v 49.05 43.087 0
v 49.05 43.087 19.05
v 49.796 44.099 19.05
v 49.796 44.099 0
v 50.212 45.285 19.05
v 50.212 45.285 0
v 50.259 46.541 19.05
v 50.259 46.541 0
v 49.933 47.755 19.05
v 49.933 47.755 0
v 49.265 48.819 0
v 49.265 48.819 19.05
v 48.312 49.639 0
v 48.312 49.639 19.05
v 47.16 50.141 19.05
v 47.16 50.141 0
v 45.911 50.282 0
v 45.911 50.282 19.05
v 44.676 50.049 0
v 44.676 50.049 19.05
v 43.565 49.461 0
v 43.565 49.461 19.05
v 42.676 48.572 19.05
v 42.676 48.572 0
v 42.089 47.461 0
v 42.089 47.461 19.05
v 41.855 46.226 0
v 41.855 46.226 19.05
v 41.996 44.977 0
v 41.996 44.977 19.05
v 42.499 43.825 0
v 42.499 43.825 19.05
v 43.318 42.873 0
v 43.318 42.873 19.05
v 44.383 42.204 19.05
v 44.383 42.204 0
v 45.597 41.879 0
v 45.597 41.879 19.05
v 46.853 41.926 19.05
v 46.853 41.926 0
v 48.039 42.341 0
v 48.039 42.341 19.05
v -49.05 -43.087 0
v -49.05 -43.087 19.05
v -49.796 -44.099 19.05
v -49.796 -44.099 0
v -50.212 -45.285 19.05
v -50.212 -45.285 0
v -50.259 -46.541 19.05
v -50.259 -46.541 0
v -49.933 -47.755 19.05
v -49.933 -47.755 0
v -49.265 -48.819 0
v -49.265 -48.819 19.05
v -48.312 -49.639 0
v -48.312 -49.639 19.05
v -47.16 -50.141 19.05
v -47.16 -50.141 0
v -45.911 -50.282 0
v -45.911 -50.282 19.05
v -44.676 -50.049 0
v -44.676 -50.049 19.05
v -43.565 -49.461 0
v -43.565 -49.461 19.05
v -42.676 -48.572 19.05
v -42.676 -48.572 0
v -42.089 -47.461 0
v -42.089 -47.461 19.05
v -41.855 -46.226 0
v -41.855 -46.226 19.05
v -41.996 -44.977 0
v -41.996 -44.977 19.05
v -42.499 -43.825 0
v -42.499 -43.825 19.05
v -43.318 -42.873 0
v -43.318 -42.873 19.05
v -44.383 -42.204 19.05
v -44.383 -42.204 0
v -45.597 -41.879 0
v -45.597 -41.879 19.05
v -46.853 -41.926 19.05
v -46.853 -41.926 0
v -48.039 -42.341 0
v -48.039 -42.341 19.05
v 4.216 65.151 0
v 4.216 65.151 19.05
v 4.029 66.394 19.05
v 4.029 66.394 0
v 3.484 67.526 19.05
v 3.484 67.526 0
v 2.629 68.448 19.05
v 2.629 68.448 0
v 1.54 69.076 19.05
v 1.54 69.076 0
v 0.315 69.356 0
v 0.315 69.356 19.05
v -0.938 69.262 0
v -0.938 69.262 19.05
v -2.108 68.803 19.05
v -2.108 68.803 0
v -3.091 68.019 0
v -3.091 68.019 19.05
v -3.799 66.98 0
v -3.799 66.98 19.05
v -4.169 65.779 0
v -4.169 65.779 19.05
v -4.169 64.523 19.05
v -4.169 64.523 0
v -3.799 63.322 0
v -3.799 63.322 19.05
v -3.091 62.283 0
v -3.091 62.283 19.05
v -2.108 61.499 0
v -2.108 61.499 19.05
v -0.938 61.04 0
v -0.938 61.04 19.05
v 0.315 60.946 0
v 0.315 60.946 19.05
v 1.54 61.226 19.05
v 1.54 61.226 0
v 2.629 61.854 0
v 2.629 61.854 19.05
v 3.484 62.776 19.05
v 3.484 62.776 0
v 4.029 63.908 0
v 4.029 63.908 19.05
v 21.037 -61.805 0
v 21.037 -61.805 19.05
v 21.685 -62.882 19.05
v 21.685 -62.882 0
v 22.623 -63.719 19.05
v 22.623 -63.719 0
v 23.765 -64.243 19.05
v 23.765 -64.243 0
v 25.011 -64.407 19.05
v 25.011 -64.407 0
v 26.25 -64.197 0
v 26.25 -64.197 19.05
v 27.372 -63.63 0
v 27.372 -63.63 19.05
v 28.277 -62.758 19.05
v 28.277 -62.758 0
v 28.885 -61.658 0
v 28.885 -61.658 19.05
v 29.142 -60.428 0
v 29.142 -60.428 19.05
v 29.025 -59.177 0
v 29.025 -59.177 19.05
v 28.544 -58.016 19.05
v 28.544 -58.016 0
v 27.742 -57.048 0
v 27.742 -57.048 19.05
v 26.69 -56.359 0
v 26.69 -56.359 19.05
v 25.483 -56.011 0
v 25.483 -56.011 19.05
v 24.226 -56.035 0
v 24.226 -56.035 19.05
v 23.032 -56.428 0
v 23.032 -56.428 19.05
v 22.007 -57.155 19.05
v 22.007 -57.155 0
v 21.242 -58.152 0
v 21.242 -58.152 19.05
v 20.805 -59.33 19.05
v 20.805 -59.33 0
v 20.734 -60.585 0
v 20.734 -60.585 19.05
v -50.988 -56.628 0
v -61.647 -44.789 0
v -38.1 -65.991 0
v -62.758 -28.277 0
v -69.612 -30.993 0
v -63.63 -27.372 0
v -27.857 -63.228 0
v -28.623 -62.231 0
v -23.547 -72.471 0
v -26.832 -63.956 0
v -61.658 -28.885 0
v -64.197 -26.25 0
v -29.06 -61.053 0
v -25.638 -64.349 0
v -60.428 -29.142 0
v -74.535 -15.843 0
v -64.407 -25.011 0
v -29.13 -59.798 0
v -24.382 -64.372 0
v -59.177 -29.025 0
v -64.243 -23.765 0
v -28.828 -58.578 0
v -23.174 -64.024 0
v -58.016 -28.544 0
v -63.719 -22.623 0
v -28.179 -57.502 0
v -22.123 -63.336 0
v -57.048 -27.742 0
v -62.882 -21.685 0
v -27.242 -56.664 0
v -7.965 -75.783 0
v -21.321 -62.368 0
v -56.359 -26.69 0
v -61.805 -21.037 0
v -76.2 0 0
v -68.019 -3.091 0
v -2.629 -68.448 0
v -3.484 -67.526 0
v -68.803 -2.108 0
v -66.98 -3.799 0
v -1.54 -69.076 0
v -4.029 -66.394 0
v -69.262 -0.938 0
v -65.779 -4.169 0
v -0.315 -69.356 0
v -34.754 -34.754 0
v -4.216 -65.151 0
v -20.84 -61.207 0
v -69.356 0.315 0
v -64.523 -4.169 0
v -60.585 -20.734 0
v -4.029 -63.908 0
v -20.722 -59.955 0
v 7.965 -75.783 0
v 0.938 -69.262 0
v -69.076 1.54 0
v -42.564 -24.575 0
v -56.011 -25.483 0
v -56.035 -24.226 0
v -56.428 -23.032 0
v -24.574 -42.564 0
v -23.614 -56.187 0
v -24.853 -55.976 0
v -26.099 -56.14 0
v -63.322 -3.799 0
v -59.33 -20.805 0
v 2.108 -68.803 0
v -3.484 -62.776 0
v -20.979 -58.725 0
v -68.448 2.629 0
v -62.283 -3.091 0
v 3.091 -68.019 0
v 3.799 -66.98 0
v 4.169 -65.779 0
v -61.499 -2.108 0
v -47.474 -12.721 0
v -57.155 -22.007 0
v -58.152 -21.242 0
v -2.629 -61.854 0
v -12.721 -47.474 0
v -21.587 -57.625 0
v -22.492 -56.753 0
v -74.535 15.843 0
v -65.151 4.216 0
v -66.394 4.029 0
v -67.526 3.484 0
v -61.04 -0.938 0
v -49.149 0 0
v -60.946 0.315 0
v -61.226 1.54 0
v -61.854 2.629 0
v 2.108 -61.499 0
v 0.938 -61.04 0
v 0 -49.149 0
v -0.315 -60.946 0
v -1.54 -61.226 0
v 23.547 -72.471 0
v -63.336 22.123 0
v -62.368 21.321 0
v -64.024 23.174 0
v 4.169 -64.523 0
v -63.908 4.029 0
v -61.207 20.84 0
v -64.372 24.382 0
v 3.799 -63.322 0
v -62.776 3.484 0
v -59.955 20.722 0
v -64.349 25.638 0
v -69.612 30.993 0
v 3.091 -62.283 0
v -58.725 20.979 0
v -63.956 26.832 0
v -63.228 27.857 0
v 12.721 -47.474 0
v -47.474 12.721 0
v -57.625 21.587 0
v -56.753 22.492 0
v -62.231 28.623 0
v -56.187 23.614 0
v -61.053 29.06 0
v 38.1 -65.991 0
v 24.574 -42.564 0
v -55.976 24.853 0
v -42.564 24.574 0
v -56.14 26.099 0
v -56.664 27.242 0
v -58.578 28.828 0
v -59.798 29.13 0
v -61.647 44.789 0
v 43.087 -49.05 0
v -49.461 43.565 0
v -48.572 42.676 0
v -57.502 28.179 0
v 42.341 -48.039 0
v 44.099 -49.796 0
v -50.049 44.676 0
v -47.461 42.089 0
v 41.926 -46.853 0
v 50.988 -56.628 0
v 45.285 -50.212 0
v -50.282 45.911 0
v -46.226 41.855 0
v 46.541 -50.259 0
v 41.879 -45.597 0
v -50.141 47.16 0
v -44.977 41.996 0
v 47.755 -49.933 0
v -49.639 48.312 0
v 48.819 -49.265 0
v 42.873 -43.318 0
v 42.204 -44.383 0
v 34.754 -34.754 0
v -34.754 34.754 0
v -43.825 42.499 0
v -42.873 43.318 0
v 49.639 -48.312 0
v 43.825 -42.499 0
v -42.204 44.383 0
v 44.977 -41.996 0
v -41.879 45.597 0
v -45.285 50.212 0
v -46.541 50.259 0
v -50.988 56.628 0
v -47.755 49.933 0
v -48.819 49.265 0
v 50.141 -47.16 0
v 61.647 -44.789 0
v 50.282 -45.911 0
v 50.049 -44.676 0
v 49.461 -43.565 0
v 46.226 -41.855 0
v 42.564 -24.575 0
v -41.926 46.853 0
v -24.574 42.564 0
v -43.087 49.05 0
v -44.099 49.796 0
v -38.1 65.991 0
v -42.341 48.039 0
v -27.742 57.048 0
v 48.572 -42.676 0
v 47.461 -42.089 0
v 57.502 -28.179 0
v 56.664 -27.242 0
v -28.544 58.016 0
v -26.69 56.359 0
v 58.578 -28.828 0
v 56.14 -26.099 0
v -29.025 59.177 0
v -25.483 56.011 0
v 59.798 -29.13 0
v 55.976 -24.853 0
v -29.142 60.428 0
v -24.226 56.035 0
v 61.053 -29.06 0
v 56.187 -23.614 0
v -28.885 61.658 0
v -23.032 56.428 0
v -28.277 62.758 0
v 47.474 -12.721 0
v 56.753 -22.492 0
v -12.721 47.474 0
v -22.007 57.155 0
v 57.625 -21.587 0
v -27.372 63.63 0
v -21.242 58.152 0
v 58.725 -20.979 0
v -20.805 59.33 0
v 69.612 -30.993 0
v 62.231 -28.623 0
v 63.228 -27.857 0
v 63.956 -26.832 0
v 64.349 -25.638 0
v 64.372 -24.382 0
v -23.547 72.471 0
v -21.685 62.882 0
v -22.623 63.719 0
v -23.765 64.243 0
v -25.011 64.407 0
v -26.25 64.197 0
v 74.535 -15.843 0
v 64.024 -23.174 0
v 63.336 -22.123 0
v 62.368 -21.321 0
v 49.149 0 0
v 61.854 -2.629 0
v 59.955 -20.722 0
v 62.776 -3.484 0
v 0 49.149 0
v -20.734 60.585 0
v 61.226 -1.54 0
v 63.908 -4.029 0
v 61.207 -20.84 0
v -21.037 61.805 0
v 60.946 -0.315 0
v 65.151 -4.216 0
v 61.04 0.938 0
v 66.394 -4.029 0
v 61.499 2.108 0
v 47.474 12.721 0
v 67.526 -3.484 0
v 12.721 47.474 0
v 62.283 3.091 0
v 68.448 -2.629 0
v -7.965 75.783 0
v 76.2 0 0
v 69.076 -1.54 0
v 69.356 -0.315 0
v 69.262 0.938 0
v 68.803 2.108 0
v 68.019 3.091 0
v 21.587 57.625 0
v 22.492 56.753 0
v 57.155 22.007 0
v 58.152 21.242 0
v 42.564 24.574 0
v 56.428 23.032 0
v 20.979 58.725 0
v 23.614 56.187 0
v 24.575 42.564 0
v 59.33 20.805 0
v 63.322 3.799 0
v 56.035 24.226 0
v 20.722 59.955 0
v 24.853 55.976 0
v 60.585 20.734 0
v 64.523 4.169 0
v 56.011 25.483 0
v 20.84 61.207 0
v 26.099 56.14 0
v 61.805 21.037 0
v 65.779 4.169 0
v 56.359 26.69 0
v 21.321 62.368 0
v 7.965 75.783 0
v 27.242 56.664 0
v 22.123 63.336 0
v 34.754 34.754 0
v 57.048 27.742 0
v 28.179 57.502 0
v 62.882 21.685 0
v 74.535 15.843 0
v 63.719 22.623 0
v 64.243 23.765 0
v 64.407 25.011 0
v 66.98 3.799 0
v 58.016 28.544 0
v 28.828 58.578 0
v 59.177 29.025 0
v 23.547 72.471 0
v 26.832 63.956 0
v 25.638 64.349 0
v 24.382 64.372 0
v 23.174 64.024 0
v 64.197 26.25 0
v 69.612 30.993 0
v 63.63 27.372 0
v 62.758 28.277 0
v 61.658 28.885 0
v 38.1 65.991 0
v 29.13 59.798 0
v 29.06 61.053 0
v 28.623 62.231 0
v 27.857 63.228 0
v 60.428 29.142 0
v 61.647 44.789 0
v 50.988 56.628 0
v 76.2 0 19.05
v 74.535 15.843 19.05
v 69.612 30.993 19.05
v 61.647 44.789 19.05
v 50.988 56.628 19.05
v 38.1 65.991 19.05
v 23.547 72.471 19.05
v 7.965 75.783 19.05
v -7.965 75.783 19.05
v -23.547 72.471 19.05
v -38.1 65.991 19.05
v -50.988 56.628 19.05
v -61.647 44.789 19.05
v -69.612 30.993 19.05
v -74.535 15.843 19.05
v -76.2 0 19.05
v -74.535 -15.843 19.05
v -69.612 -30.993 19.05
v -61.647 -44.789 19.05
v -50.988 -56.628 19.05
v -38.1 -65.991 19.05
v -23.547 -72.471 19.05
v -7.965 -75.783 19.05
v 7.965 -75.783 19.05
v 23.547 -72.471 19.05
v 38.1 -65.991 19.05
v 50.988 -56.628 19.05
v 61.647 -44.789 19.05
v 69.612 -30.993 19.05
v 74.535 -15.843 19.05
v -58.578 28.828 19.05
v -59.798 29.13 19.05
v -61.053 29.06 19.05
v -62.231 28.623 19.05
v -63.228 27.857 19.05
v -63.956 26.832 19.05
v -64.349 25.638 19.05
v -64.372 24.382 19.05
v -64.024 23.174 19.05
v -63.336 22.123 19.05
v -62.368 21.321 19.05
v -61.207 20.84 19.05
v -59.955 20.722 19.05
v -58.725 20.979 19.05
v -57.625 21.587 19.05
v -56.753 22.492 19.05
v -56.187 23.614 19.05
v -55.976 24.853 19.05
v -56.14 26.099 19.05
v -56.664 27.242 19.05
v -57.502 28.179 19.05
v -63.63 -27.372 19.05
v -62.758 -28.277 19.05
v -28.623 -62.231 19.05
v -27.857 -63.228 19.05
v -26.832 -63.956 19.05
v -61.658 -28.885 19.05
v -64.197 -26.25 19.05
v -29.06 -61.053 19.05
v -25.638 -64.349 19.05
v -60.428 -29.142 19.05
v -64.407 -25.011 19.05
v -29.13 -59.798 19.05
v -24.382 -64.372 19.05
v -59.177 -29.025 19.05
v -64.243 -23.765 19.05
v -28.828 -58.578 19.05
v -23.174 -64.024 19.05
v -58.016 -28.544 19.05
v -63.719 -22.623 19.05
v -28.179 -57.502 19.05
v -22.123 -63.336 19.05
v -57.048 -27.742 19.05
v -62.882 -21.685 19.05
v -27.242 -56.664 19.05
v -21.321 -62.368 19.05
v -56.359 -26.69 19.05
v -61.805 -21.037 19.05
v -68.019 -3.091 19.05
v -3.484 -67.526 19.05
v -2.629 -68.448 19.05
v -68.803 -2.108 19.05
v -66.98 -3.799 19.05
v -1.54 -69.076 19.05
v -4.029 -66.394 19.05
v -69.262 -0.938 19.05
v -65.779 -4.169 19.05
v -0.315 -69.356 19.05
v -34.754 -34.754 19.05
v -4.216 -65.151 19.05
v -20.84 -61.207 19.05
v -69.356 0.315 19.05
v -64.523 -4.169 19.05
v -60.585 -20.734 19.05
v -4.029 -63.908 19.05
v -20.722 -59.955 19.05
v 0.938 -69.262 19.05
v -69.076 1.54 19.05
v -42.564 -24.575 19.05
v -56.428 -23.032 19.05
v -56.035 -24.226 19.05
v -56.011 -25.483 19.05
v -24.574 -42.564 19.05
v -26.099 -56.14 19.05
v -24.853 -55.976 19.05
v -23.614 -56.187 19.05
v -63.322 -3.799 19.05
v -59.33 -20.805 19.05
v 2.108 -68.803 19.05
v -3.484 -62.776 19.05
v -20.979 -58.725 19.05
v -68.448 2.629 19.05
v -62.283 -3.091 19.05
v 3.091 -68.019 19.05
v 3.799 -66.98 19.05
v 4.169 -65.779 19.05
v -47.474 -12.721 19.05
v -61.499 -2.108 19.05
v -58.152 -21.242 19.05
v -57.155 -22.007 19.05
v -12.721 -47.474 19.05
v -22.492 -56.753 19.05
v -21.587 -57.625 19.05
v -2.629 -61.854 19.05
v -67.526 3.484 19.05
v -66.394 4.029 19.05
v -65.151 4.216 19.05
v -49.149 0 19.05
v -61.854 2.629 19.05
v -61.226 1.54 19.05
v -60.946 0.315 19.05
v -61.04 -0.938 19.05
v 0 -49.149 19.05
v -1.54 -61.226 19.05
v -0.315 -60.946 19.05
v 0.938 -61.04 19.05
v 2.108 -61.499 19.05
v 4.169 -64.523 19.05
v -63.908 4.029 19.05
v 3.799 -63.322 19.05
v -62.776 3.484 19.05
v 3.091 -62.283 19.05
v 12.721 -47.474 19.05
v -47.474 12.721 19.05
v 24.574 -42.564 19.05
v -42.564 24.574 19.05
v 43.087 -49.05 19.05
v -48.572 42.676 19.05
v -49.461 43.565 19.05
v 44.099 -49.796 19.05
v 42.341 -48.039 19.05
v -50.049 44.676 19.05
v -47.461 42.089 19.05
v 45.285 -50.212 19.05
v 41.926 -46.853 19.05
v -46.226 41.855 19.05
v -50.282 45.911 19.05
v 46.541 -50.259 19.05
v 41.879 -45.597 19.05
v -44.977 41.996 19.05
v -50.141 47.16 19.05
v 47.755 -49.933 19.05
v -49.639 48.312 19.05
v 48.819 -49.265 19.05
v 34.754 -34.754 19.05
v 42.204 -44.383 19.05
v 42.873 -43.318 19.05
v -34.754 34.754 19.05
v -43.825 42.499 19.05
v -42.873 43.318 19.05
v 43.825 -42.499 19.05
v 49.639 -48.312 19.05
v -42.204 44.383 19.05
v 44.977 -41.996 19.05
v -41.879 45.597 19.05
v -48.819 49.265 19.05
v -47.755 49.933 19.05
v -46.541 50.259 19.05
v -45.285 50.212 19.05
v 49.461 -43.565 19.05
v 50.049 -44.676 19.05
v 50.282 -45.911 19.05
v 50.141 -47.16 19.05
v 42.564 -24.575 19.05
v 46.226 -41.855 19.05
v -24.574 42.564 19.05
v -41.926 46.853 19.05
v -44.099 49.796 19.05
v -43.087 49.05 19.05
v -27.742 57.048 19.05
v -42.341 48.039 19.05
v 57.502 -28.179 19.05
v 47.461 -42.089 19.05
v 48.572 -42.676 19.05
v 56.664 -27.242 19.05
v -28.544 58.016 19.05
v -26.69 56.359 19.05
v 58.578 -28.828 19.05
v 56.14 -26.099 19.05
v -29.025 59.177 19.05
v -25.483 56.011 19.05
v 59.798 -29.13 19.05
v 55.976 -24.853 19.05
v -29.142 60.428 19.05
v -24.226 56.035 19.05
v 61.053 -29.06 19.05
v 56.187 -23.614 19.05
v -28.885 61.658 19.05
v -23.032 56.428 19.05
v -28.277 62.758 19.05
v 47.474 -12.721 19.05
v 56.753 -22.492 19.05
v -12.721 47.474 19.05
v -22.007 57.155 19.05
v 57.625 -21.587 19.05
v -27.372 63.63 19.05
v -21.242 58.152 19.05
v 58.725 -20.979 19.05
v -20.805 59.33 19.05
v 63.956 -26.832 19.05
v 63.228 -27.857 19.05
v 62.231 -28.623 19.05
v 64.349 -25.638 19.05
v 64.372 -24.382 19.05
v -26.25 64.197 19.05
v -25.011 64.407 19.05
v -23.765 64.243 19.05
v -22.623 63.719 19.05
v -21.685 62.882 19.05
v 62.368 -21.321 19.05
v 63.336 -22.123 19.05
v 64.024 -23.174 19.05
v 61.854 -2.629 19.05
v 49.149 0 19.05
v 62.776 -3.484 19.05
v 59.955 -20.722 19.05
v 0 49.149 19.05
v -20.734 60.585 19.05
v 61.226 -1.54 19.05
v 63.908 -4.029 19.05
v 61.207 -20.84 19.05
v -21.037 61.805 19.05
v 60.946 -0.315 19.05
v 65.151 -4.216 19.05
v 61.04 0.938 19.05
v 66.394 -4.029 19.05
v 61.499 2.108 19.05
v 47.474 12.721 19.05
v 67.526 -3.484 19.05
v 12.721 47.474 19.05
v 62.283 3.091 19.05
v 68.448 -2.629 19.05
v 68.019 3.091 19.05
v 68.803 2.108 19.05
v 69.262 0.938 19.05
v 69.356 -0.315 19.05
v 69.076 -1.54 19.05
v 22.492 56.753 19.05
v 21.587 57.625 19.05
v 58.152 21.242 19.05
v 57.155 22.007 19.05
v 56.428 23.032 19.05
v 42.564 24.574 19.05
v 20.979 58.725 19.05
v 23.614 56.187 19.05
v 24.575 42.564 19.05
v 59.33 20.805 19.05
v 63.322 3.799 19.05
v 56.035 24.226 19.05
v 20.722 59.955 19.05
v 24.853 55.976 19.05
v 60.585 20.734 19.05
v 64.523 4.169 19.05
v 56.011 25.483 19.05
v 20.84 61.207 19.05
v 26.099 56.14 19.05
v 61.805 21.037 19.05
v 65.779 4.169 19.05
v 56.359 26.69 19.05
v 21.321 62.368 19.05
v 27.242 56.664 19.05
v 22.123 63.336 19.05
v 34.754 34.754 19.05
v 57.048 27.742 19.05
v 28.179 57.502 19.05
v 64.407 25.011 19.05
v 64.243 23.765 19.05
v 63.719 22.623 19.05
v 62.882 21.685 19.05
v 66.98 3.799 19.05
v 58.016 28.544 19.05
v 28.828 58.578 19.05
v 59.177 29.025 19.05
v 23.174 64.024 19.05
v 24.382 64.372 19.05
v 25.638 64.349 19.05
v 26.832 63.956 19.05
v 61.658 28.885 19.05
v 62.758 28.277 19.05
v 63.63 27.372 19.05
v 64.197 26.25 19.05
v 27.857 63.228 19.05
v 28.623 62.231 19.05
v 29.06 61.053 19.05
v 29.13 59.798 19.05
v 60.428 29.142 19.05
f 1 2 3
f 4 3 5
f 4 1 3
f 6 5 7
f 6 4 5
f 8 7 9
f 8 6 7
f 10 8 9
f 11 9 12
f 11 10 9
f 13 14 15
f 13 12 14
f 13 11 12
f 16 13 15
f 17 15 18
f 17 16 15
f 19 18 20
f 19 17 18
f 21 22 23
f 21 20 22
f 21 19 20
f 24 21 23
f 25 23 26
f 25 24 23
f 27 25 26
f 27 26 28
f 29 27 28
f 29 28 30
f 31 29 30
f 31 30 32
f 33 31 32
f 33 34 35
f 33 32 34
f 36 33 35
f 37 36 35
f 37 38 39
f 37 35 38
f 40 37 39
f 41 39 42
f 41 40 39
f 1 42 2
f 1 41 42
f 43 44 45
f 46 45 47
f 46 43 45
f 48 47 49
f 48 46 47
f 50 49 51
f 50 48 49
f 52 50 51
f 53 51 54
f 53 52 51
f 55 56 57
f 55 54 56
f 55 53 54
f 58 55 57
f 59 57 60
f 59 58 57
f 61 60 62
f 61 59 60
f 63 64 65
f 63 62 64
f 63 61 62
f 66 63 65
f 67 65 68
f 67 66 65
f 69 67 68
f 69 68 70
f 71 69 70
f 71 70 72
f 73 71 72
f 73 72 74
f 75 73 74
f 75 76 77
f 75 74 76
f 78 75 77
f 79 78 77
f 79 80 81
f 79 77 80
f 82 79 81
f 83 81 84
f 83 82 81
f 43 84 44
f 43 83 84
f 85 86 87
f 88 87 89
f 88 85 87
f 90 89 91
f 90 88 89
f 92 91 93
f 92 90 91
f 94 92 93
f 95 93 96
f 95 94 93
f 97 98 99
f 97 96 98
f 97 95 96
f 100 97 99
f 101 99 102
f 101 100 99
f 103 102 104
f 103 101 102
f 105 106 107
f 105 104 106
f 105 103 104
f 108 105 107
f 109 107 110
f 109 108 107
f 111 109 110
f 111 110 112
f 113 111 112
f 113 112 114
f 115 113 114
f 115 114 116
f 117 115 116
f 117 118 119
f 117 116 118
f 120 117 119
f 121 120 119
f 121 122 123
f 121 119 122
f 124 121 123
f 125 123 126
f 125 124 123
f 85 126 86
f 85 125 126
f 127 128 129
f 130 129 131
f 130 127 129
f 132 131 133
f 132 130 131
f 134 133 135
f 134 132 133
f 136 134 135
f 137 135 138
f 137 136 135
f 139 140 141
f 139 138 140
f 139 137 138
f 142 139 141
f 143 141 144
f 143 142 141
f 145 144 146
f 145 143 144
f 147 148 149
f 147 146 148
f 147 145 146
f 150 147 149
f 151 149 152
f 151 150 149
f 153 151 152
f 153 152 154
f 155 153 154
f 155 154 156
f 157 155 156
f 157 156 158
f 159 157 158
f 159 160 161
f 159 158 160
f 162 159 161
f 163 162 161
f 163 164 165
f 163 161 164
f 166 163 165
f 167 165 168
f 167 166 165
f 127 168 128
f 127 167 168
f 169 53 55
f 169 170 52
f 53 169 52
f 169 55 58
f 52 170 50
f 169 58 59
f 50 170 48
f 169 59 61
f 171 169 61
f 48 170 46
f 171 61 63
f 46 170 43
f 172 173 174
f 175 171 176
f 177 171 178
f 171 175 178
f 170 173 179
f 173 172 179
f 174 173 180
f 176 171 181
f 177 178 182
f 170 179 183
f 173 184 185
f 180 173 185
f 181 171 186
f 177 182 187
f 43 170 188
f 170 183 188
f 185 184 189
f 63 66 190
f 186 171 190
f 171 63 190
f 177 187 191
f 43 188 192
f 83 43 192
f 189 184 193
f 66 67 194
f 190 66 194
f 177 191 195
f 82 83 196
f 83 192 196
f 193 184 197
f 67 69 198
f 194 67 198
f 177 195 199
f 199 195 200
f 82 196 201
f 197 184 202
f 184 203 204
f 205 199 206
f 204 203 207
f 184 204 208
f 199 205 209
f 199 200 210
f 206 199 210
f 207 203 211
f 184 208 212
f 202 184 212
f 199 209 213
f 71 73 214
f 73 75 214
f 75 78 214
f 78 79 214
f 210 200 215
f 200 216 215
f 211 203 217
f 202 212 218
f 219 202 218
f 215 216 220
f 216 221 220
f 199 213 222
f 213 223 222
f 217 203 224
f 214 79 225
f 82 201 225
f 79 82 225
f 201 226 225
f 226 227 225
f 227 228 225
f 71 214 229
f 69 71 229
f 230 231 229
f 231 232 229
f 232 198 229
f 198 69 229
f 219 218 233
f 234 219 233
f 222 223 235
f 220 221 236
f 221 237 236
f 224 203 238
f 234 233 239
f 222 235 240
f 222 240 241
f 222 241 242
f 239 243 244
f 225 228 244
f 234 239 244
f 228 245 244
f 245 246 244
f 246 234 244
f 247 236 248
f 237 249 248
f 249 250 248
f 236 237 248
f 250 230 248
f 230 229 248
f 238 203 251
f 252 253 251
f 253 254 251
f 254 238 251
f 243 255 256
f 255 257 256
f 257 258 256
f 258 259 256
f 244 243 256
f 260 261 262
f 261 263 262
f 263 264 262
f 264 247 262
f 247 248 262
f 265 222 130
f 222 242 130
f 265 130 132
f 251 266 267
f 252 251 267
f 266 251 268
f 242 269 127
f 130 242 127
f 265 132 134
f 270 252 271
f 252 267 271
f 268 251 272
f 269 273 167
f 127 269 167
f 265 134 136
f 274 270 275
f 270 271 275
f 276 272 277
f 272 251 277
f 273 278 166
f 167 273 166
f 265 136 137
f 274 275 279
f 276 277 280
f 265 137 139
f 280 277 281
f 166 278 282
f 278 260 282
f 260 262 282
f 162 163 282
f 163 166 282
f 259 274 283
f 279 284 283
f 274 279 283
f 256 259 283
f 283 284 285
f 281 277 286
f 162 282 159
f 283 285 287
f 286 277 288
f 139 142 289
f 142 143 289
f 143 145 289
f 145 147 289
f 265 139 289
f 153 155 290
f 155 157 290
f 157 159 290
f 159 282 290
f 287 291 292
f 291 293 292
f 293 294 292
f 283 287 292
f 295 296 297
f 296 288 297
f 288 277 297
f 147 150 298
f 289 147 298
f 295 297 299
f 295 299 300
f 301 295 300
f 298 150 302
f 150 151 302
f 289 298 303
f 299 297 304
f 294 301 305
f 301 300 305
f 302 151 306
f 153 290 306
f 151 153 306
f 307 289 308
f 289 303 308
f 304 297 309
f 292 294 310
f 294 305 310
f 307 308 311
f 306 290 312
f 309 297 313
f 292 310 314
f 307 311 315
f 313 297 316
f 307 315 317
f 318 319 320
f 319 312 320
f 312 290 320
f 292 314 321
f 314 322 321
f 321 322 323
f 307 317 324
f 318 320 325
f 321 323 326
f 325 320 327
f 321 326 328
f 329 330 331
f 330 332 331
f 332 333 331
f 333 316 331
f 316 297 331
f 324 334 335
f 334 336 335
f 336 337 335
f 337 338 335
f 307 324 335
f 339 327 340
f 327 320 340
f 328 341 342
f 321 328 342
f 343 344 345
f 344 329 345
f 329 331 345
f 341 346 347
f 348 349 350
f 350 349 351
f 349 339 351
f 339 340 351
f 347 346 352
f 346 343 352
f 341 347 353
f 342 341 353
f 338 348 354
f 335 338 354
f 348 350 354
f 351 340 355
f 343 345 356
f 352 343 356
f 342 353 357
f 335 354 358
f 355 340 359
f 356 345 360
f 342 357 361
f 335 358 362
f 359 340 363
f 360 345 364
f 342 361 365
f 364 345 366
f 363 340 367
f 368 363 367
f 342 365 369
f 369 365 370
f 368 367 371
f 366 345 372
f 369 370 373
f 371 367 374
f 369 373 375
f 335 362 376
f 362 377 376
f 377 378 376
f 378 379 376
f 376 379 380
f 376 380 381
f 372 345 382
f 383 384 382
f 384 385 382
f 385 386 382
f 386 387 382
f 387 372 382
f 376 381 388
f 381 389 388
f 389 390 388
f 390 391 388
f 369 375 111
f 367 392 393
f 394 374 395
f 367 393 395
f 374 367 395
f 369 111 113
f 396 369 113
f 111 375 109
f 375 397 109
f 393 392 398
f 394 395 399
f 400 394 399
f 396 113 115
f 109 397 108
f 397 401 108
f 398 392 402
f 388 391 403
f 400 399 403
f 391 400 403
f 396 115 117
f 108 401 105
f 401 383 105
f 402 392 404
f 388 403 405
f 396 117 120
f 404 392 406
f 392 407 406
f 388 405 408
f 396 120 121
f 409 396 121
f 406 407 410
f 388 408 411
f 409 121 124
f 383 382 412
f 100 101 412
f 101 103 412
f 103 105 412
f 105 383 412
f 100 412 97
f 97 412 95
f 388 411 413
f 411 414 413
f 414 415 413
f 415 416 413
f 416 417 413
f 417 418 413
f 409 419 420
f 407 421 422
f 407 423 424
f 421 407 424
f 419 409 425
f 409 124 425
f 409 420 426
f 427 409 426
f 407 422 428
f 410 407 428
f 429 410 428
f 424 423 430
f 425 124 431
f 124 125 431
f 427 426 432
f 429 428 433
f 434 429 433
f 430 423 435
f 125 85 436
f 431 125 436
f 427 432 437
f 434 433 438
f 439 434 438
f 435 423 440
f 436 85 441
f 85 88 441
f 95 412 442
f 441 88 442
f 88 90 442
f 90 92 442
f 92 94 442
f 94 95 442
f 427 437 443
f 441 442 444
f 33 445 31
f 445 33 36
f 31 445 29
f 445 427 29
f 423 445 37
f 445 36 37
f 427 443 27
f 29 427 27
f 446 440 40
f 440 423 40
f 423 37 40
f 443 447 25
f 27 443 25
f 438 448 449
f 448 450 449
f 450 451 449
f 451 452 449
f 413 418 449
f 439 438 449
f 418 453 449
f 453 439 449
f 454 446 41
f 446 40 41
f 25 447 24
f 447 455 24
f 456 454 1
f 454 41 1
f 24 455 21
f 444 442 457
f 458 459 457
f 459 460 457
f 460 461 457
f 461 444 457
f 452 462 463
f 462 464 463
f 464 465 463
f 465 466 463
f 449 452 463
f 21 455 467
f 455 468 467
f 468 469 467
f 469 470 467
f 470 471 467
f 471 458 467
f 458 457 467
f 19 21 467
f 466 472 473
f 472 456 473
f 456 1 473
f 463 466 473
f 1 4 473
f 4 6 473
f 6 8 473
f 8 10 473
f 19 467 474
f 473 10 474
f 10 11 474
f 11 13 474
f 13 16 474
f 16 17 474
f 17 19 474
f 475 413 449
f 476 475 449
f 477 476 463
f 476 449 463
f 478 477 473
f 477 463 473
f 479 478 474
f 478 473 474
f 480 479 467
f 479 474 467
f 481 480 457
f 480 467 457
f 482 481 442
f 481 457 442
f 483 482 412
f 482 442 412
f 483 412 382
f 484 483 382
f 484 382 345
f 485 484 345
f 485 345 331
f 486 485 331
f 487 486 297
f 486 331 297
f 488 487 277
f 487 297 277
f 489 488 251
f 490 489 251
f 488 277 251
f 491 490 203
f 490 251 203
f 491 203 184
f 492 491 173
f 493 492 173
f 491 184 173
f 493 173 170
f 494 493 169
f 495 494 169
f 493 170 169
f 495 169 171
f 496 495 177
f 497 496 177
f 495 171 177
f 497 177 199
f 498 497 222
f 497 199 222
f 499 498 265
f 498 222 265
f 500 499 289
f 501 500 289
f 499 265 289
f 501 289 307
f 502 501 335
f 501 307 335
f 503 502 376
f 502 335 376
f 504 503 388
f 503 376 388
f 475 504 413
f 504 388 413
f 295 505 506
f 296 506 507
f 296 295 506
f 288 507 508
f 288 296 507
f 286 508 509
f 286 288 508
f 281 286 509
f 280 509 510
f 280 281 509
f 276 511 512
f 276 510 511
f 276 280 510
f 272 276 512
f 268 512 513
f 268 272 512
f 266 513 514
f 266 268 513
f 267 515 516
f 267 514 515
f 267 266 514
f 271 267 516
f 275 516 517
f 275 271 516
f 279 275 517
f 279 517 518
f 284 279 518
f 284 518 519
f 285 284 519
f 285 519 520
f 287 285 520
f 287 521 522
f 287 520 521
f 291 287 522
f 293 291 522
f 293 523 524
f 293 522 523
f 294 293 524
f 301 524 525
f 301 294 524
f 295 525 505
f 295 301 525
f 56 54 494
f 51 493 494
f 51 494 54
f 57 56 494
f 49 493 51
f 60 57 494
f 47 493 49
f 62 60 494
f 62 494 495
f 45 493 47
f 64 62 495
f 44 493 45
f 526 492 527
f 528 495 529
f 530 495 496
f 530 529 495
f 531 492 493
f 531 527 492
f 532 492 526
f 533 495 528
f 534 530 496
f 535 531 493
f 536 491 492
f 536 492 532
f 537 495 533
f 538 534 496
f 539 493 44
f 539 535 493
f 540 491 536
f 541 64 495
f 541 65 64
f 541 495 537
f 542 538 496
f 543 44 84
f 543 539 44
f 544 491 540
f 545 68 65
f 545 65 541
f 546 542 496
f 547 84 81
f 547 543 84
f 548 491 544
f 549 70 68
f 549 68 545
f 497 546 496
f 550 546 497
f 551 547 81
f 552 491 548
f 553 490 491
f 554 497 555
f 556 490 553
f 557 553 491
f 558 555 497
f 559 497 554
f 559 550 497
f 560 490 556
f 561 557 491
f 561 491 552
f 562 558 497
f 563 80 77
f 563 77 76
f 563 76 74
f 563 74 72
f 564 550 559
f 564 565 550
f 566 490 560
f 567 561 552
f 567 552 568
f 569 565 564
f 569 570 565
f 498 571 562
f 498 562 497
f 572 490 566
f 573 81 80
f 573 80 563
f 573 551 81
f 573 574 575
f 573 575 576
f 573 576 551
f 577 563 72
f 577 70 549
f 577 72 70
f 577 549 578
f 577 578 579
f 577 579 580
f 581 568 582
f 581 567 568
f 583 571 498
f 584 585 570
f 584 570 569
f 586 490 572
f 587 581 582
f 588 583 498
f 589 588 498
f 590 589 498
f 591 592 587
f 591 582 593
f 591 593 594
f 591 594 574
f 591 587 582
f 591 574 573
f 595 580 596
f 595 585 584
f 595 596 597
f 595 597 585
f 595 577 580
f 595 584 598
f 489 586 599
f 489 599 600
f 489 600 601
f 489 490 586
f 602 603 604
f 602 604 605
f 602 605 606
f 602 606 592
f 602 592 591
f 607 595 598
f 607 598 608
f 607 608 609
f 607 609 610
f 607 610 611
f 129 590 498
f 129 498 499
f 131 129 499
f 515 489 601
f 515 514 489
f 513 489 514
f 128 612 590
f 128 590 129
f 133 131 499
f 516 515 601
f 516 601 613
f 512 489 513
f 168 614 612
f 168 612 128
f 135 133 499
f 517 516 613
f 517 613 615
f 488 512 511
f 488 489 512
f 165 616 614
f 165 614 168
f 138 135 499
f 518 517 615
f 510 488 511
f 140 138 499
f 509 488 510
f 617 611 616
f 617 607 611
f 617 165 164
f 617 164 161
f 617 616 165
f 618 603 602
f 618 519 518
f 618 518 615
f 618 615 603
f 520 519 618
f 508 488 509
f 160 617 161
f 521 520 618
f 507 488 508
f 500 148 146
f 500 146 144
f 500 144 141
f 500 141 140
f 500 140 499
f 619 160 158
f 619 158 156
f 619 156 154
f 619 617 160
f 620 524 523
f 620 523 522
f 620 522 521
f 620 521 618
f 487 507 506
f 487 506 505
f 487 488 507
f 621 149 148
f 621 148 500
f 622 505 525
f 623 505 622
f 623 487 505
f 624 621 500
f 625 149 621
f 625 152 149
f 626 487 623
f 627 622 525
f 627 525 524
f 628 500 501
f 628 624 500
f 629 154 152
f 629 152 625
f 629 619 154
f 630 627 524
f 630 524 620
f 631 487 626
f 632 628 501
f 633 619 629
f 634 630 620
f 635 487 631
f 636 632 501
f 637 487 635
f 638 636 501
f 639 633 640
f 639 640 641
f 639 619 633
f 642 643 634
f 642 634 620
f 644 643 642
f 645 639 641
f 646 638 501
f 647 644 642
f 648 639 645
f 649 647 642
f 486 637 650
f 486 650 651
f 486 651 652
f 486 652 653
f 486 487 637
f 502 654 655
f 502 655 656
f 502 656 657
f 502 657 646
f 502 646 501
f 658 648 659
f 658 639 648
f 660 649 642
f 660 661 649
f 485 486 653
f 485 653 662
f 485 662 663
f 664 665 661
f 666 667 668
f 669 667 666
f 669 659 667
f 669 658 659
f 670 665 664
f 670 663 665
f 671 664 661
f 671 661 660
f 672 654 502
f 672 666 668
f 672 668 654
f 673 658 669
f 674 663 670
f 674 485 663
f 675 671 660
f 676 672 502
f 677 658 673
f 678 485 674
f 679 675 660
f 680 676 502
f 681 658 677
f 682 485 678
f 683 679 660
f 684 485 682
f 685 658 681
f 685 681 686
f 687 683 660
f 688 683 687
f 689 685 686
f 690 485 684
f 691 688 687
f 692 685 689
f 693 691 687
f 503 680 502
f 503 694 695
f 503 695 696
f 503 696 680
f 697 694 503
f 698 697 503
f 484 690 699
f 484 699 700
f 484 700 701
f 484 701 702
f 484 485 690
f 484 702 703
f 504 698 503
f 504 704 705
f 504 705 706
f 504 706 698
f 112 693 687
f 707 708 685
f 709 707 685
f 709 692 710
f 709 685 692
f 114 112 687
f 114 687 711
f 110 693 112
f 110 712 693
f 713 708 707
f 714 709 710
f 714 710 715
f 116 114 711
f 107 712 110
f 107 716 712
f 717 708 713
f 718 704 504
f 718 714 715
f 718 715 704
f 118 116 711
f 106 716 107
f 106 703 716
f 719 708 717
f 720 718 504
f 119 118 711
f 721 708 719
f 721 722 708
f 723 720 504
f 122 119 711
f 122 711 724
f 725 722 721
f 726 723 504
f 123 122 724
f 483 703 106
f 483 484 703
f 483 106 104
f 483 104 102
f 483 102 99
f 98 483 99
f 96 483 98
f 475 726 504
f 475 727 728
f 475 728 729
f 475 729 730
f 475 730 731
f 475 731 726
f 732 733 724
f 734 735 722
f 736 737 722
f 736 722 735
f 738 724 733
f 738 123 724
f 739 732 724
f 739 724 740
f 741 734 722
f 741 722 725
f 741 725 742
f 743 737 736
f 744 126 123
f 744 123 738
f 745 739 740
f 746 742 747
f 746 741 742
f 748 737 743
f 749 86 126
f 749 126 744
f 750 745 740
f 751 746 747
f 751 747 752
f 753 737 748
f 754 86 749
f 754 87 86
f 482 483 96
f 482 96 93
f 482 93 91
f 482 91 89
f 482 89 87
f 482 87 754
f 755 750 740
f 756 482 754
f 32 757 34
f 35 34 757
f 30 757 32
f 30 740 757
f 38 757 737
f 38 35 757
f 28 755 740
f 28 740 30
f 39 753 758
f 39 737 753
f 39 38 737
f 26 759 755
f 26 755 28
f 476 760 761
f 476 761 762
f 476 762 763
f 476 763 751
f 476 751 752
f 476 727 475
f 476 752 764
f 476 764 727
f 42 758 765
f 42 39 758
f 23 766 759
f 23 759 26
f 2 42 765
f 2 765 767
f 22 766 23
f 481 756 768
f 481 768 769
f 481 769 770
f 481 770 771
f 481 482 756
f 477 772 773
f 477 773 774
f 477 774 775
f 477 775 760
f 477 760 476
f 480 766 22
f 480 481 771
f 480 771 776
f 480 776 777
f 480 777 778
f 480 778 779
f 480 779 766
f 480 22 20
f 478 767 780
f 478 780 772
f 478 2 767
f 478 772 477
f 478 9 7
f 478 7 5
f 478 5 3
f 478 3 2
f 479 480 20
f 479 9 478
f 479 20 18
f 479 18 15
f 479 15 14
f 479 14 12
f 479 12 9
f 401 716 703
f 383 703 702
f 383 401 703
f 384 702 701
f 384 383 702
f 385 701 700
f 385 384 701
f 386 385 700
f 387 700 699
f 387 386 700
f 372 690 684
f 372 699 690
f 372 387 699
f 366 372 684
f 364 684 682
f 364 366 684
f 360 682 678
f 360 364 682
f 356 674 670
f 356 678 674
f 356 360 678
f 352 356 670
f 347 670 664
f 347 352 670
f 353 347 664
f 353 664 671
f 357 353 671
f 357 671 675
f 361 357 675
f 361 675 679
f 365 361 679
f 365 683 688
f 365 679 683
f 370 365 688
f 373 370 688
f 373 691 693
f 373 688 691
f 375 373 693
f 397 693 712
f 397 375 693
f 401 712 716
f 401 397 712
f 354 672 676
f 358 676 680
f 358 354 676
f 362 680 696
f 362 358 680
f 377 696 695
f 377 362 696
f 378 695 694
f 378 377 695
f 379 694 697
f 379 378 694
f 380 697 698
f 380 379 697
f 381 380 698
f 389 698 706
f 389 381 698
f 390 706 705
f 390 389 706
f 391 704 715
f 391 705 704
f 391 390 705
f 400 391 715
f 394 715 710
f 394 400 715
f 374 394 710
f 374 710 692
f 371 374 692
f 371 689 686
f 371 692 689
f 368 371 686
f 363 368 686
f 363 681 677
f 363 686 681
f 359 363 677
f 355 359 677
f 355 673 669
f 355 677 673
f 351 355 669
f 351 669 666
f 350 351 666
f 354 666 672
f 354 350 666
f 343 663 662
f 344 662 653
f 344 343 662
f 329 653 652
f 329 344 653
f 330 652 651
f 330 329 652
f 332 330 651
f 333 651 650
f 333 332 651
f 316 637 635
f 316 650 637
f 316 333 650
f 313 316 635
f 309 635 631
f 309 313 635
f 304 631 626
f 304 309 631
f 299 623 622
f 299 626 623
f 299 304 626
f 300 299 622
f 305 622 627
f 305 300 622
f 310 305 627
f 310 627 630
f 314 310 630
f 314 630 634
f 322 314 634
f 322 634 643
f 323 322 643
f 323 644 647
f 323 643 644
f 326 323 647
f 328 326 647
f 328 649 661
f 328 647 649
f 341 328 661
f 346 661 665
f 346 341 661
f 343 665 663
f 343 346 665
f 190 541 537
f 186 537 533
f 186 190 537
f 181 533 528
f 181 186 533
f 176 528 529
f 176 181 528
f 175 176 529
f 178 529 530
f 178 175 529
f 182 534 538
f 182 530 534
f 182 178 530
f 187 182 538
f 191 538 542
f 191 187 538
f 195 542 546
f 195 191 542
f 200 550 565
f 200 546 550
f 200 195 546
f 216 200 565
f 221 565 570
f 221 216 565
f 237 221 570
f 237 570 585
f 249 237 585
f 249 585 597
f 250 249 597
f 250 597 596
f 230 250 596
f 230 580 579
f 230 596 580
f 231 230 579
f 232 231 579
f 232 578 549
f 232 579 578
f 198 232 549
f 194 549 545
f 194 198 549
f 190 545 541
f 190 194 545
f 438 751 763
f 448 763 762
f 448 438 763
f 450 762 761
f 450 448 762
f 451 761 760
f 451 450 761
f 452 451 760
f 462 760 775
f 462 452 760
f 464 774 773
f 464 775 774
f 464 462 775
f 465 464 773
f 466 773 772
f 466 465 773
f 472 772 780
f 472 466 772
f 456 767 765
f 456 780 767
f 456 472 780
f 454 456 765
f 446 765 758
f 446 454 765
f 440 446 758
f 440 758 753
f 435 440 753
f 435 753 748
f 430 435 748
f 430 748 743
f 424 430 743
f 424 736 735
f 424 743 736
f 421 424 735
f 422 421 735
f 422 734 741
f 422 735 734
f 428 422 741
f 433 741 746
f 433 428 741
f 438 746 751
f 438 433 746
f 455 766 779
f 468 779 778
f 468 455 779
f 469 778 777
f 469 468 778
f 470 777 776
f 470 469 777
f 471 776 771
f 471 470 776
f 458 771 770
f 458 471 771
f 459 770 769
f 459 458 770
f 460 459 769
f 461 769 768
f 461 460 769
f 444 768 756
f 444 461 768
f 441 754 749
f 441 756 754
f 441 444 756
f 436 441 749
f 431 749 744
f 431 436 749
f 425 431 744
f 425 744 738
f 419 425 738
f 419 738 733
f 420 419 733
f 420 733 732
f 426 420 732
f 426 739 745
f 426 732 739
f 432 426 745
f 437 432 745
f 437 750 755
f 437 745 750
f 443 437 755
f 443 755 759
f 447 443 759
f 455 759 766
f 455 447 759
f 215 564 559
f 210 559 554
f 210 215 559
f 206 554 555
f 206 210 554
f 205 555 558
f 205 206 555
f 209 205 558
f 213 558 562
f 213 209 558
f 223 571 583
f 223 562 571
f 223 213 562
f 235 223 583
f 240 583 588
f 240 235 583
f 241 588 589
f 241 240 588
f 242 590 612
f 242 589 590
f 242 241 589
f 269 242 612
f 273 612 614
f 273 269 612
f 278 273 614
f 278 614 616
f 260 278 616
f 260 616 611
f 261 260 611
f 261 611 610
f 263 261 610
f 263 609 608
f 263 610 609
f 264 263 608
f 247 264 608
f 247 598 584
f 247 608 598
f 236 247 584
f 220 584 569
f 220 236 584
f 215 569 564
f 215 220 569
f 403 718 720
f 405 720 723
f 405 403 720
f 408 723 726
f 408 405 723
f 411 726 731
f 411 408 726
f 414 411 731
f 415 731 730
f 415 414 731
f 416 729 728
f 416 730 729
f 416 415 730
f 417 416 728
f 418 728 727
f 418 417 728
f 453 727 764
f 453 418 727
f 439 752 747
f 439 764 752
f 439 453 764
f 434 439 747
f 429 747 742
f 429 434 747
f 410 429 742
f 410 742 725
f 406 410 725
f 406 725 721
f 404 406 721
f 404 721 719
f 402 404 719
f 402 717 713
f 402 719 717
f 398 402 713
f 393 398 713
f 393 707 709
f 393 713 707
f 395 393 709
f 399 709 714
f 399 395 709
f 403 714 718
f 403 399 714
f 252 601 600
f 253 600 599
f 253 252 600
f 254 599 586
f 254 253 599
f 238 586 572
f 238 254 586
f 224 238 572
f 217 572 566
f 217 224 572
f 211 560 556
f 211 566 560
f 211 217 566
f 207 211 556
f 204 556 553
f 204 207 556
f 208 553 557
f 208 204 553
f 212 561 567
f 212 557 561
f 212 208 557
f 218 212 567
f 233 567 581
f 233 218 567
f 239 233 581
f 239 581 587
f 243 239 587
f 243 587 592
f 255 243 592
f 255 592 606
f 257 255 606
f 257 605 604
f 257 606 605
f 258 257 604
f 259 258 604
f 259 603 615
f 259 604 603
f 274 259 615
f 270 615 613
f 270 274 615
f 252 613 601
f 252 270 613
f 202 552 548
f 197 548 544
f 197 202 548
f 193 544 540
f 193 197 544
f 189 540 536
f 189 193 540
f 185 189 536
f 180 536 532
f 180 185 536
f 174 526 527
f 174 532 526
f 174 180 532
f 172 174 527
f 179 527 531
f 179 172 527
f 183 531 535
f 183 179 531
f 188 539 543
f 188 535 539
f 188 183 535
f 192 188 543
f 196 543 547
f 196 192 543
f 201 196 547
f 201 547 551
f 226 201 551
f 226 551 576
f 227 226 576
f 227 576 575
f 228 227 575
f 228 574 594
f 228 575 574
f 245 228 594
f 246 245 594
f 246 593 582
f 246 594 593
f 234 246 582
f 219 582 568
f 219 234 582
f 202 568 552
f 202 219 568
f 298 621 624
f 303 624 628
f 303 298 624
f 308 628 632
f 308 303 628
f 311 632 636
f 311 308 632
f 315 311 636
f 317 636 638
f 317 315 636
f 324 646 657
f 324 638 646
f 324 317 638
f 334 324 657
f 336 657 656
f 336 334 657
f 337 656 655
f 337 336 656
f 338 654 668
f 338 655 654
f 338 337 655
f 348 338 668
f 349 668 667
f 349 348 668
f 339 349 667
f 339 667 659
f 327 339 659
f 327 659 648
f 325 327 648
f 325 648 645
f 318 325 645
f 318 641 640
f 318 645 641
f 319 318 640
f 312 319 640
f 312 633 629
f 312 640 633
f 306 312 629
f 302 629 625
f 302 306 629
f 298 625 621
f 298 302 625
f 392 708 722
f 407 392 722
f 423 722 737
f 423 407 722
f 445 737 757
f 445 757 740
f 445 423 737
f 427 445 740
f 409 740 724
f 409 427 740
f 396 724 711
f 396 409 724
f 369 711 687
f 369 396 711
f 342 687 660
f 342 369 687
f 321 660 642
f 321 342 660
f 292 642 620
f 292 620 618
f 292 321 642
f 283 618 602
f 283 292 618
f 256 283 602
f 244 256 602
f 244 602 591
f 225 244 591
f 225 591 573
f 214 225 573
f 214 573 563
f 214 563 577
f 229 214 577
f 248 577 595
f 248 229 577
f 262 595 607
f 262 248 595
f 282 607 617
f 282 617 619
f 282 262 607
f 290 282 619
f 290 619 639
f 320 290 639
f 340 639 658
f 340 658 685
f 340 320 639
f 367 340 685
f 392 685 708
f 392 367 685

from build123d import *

# Parameters (mm, degrees)
SKETCH1_R           = 76.2
SKETCH1_R_2         = 49.149
EXTRUDE_THIN1_DEPTH = 19.05
SKETCH2_R           = 4.2164
CUT_EXTRUDE3_DEPTH  = 110.433918417
CIRPATTERN1_COUNT   = 16


with BuildPart() as part:
    # Sketch1 → Extrude-Thin1 (new body)
    with BuildSketch(Plane.XY):
        Circle(SKETCH1_R)
        Circle(SKETCH1_R_2, mode=Mode.SUBTRACT)
    extrude(amount=EXTRUDE_THIN1_DEPTH)

    # Sketch2 → Cut-Extrude3 (cut, through all)
    with BuildSketch(Plane.XY):
        with Locations((0, 65.151)):
            Circle(SKETCH2_R)
    cut_extrude3 = extrude(amount=CUT_EXTRUDE3_DEPTH, mode=Mode.SUBTRACT)

    # CirPattern1: Cut-Extrude3 ×16 about axis
    cirpattern1_axis = Axis((0, 0, 78.235991327), (0, 0, -1))
    for i in range(1, CIRPATTERN1_COUNT):
        add(cut_extrude3.rotate(cirpattern1_axis, i * 360 / CIRPATTERN1_COUNT), mode=Mode.SUBTRACT)


solid = part.part
